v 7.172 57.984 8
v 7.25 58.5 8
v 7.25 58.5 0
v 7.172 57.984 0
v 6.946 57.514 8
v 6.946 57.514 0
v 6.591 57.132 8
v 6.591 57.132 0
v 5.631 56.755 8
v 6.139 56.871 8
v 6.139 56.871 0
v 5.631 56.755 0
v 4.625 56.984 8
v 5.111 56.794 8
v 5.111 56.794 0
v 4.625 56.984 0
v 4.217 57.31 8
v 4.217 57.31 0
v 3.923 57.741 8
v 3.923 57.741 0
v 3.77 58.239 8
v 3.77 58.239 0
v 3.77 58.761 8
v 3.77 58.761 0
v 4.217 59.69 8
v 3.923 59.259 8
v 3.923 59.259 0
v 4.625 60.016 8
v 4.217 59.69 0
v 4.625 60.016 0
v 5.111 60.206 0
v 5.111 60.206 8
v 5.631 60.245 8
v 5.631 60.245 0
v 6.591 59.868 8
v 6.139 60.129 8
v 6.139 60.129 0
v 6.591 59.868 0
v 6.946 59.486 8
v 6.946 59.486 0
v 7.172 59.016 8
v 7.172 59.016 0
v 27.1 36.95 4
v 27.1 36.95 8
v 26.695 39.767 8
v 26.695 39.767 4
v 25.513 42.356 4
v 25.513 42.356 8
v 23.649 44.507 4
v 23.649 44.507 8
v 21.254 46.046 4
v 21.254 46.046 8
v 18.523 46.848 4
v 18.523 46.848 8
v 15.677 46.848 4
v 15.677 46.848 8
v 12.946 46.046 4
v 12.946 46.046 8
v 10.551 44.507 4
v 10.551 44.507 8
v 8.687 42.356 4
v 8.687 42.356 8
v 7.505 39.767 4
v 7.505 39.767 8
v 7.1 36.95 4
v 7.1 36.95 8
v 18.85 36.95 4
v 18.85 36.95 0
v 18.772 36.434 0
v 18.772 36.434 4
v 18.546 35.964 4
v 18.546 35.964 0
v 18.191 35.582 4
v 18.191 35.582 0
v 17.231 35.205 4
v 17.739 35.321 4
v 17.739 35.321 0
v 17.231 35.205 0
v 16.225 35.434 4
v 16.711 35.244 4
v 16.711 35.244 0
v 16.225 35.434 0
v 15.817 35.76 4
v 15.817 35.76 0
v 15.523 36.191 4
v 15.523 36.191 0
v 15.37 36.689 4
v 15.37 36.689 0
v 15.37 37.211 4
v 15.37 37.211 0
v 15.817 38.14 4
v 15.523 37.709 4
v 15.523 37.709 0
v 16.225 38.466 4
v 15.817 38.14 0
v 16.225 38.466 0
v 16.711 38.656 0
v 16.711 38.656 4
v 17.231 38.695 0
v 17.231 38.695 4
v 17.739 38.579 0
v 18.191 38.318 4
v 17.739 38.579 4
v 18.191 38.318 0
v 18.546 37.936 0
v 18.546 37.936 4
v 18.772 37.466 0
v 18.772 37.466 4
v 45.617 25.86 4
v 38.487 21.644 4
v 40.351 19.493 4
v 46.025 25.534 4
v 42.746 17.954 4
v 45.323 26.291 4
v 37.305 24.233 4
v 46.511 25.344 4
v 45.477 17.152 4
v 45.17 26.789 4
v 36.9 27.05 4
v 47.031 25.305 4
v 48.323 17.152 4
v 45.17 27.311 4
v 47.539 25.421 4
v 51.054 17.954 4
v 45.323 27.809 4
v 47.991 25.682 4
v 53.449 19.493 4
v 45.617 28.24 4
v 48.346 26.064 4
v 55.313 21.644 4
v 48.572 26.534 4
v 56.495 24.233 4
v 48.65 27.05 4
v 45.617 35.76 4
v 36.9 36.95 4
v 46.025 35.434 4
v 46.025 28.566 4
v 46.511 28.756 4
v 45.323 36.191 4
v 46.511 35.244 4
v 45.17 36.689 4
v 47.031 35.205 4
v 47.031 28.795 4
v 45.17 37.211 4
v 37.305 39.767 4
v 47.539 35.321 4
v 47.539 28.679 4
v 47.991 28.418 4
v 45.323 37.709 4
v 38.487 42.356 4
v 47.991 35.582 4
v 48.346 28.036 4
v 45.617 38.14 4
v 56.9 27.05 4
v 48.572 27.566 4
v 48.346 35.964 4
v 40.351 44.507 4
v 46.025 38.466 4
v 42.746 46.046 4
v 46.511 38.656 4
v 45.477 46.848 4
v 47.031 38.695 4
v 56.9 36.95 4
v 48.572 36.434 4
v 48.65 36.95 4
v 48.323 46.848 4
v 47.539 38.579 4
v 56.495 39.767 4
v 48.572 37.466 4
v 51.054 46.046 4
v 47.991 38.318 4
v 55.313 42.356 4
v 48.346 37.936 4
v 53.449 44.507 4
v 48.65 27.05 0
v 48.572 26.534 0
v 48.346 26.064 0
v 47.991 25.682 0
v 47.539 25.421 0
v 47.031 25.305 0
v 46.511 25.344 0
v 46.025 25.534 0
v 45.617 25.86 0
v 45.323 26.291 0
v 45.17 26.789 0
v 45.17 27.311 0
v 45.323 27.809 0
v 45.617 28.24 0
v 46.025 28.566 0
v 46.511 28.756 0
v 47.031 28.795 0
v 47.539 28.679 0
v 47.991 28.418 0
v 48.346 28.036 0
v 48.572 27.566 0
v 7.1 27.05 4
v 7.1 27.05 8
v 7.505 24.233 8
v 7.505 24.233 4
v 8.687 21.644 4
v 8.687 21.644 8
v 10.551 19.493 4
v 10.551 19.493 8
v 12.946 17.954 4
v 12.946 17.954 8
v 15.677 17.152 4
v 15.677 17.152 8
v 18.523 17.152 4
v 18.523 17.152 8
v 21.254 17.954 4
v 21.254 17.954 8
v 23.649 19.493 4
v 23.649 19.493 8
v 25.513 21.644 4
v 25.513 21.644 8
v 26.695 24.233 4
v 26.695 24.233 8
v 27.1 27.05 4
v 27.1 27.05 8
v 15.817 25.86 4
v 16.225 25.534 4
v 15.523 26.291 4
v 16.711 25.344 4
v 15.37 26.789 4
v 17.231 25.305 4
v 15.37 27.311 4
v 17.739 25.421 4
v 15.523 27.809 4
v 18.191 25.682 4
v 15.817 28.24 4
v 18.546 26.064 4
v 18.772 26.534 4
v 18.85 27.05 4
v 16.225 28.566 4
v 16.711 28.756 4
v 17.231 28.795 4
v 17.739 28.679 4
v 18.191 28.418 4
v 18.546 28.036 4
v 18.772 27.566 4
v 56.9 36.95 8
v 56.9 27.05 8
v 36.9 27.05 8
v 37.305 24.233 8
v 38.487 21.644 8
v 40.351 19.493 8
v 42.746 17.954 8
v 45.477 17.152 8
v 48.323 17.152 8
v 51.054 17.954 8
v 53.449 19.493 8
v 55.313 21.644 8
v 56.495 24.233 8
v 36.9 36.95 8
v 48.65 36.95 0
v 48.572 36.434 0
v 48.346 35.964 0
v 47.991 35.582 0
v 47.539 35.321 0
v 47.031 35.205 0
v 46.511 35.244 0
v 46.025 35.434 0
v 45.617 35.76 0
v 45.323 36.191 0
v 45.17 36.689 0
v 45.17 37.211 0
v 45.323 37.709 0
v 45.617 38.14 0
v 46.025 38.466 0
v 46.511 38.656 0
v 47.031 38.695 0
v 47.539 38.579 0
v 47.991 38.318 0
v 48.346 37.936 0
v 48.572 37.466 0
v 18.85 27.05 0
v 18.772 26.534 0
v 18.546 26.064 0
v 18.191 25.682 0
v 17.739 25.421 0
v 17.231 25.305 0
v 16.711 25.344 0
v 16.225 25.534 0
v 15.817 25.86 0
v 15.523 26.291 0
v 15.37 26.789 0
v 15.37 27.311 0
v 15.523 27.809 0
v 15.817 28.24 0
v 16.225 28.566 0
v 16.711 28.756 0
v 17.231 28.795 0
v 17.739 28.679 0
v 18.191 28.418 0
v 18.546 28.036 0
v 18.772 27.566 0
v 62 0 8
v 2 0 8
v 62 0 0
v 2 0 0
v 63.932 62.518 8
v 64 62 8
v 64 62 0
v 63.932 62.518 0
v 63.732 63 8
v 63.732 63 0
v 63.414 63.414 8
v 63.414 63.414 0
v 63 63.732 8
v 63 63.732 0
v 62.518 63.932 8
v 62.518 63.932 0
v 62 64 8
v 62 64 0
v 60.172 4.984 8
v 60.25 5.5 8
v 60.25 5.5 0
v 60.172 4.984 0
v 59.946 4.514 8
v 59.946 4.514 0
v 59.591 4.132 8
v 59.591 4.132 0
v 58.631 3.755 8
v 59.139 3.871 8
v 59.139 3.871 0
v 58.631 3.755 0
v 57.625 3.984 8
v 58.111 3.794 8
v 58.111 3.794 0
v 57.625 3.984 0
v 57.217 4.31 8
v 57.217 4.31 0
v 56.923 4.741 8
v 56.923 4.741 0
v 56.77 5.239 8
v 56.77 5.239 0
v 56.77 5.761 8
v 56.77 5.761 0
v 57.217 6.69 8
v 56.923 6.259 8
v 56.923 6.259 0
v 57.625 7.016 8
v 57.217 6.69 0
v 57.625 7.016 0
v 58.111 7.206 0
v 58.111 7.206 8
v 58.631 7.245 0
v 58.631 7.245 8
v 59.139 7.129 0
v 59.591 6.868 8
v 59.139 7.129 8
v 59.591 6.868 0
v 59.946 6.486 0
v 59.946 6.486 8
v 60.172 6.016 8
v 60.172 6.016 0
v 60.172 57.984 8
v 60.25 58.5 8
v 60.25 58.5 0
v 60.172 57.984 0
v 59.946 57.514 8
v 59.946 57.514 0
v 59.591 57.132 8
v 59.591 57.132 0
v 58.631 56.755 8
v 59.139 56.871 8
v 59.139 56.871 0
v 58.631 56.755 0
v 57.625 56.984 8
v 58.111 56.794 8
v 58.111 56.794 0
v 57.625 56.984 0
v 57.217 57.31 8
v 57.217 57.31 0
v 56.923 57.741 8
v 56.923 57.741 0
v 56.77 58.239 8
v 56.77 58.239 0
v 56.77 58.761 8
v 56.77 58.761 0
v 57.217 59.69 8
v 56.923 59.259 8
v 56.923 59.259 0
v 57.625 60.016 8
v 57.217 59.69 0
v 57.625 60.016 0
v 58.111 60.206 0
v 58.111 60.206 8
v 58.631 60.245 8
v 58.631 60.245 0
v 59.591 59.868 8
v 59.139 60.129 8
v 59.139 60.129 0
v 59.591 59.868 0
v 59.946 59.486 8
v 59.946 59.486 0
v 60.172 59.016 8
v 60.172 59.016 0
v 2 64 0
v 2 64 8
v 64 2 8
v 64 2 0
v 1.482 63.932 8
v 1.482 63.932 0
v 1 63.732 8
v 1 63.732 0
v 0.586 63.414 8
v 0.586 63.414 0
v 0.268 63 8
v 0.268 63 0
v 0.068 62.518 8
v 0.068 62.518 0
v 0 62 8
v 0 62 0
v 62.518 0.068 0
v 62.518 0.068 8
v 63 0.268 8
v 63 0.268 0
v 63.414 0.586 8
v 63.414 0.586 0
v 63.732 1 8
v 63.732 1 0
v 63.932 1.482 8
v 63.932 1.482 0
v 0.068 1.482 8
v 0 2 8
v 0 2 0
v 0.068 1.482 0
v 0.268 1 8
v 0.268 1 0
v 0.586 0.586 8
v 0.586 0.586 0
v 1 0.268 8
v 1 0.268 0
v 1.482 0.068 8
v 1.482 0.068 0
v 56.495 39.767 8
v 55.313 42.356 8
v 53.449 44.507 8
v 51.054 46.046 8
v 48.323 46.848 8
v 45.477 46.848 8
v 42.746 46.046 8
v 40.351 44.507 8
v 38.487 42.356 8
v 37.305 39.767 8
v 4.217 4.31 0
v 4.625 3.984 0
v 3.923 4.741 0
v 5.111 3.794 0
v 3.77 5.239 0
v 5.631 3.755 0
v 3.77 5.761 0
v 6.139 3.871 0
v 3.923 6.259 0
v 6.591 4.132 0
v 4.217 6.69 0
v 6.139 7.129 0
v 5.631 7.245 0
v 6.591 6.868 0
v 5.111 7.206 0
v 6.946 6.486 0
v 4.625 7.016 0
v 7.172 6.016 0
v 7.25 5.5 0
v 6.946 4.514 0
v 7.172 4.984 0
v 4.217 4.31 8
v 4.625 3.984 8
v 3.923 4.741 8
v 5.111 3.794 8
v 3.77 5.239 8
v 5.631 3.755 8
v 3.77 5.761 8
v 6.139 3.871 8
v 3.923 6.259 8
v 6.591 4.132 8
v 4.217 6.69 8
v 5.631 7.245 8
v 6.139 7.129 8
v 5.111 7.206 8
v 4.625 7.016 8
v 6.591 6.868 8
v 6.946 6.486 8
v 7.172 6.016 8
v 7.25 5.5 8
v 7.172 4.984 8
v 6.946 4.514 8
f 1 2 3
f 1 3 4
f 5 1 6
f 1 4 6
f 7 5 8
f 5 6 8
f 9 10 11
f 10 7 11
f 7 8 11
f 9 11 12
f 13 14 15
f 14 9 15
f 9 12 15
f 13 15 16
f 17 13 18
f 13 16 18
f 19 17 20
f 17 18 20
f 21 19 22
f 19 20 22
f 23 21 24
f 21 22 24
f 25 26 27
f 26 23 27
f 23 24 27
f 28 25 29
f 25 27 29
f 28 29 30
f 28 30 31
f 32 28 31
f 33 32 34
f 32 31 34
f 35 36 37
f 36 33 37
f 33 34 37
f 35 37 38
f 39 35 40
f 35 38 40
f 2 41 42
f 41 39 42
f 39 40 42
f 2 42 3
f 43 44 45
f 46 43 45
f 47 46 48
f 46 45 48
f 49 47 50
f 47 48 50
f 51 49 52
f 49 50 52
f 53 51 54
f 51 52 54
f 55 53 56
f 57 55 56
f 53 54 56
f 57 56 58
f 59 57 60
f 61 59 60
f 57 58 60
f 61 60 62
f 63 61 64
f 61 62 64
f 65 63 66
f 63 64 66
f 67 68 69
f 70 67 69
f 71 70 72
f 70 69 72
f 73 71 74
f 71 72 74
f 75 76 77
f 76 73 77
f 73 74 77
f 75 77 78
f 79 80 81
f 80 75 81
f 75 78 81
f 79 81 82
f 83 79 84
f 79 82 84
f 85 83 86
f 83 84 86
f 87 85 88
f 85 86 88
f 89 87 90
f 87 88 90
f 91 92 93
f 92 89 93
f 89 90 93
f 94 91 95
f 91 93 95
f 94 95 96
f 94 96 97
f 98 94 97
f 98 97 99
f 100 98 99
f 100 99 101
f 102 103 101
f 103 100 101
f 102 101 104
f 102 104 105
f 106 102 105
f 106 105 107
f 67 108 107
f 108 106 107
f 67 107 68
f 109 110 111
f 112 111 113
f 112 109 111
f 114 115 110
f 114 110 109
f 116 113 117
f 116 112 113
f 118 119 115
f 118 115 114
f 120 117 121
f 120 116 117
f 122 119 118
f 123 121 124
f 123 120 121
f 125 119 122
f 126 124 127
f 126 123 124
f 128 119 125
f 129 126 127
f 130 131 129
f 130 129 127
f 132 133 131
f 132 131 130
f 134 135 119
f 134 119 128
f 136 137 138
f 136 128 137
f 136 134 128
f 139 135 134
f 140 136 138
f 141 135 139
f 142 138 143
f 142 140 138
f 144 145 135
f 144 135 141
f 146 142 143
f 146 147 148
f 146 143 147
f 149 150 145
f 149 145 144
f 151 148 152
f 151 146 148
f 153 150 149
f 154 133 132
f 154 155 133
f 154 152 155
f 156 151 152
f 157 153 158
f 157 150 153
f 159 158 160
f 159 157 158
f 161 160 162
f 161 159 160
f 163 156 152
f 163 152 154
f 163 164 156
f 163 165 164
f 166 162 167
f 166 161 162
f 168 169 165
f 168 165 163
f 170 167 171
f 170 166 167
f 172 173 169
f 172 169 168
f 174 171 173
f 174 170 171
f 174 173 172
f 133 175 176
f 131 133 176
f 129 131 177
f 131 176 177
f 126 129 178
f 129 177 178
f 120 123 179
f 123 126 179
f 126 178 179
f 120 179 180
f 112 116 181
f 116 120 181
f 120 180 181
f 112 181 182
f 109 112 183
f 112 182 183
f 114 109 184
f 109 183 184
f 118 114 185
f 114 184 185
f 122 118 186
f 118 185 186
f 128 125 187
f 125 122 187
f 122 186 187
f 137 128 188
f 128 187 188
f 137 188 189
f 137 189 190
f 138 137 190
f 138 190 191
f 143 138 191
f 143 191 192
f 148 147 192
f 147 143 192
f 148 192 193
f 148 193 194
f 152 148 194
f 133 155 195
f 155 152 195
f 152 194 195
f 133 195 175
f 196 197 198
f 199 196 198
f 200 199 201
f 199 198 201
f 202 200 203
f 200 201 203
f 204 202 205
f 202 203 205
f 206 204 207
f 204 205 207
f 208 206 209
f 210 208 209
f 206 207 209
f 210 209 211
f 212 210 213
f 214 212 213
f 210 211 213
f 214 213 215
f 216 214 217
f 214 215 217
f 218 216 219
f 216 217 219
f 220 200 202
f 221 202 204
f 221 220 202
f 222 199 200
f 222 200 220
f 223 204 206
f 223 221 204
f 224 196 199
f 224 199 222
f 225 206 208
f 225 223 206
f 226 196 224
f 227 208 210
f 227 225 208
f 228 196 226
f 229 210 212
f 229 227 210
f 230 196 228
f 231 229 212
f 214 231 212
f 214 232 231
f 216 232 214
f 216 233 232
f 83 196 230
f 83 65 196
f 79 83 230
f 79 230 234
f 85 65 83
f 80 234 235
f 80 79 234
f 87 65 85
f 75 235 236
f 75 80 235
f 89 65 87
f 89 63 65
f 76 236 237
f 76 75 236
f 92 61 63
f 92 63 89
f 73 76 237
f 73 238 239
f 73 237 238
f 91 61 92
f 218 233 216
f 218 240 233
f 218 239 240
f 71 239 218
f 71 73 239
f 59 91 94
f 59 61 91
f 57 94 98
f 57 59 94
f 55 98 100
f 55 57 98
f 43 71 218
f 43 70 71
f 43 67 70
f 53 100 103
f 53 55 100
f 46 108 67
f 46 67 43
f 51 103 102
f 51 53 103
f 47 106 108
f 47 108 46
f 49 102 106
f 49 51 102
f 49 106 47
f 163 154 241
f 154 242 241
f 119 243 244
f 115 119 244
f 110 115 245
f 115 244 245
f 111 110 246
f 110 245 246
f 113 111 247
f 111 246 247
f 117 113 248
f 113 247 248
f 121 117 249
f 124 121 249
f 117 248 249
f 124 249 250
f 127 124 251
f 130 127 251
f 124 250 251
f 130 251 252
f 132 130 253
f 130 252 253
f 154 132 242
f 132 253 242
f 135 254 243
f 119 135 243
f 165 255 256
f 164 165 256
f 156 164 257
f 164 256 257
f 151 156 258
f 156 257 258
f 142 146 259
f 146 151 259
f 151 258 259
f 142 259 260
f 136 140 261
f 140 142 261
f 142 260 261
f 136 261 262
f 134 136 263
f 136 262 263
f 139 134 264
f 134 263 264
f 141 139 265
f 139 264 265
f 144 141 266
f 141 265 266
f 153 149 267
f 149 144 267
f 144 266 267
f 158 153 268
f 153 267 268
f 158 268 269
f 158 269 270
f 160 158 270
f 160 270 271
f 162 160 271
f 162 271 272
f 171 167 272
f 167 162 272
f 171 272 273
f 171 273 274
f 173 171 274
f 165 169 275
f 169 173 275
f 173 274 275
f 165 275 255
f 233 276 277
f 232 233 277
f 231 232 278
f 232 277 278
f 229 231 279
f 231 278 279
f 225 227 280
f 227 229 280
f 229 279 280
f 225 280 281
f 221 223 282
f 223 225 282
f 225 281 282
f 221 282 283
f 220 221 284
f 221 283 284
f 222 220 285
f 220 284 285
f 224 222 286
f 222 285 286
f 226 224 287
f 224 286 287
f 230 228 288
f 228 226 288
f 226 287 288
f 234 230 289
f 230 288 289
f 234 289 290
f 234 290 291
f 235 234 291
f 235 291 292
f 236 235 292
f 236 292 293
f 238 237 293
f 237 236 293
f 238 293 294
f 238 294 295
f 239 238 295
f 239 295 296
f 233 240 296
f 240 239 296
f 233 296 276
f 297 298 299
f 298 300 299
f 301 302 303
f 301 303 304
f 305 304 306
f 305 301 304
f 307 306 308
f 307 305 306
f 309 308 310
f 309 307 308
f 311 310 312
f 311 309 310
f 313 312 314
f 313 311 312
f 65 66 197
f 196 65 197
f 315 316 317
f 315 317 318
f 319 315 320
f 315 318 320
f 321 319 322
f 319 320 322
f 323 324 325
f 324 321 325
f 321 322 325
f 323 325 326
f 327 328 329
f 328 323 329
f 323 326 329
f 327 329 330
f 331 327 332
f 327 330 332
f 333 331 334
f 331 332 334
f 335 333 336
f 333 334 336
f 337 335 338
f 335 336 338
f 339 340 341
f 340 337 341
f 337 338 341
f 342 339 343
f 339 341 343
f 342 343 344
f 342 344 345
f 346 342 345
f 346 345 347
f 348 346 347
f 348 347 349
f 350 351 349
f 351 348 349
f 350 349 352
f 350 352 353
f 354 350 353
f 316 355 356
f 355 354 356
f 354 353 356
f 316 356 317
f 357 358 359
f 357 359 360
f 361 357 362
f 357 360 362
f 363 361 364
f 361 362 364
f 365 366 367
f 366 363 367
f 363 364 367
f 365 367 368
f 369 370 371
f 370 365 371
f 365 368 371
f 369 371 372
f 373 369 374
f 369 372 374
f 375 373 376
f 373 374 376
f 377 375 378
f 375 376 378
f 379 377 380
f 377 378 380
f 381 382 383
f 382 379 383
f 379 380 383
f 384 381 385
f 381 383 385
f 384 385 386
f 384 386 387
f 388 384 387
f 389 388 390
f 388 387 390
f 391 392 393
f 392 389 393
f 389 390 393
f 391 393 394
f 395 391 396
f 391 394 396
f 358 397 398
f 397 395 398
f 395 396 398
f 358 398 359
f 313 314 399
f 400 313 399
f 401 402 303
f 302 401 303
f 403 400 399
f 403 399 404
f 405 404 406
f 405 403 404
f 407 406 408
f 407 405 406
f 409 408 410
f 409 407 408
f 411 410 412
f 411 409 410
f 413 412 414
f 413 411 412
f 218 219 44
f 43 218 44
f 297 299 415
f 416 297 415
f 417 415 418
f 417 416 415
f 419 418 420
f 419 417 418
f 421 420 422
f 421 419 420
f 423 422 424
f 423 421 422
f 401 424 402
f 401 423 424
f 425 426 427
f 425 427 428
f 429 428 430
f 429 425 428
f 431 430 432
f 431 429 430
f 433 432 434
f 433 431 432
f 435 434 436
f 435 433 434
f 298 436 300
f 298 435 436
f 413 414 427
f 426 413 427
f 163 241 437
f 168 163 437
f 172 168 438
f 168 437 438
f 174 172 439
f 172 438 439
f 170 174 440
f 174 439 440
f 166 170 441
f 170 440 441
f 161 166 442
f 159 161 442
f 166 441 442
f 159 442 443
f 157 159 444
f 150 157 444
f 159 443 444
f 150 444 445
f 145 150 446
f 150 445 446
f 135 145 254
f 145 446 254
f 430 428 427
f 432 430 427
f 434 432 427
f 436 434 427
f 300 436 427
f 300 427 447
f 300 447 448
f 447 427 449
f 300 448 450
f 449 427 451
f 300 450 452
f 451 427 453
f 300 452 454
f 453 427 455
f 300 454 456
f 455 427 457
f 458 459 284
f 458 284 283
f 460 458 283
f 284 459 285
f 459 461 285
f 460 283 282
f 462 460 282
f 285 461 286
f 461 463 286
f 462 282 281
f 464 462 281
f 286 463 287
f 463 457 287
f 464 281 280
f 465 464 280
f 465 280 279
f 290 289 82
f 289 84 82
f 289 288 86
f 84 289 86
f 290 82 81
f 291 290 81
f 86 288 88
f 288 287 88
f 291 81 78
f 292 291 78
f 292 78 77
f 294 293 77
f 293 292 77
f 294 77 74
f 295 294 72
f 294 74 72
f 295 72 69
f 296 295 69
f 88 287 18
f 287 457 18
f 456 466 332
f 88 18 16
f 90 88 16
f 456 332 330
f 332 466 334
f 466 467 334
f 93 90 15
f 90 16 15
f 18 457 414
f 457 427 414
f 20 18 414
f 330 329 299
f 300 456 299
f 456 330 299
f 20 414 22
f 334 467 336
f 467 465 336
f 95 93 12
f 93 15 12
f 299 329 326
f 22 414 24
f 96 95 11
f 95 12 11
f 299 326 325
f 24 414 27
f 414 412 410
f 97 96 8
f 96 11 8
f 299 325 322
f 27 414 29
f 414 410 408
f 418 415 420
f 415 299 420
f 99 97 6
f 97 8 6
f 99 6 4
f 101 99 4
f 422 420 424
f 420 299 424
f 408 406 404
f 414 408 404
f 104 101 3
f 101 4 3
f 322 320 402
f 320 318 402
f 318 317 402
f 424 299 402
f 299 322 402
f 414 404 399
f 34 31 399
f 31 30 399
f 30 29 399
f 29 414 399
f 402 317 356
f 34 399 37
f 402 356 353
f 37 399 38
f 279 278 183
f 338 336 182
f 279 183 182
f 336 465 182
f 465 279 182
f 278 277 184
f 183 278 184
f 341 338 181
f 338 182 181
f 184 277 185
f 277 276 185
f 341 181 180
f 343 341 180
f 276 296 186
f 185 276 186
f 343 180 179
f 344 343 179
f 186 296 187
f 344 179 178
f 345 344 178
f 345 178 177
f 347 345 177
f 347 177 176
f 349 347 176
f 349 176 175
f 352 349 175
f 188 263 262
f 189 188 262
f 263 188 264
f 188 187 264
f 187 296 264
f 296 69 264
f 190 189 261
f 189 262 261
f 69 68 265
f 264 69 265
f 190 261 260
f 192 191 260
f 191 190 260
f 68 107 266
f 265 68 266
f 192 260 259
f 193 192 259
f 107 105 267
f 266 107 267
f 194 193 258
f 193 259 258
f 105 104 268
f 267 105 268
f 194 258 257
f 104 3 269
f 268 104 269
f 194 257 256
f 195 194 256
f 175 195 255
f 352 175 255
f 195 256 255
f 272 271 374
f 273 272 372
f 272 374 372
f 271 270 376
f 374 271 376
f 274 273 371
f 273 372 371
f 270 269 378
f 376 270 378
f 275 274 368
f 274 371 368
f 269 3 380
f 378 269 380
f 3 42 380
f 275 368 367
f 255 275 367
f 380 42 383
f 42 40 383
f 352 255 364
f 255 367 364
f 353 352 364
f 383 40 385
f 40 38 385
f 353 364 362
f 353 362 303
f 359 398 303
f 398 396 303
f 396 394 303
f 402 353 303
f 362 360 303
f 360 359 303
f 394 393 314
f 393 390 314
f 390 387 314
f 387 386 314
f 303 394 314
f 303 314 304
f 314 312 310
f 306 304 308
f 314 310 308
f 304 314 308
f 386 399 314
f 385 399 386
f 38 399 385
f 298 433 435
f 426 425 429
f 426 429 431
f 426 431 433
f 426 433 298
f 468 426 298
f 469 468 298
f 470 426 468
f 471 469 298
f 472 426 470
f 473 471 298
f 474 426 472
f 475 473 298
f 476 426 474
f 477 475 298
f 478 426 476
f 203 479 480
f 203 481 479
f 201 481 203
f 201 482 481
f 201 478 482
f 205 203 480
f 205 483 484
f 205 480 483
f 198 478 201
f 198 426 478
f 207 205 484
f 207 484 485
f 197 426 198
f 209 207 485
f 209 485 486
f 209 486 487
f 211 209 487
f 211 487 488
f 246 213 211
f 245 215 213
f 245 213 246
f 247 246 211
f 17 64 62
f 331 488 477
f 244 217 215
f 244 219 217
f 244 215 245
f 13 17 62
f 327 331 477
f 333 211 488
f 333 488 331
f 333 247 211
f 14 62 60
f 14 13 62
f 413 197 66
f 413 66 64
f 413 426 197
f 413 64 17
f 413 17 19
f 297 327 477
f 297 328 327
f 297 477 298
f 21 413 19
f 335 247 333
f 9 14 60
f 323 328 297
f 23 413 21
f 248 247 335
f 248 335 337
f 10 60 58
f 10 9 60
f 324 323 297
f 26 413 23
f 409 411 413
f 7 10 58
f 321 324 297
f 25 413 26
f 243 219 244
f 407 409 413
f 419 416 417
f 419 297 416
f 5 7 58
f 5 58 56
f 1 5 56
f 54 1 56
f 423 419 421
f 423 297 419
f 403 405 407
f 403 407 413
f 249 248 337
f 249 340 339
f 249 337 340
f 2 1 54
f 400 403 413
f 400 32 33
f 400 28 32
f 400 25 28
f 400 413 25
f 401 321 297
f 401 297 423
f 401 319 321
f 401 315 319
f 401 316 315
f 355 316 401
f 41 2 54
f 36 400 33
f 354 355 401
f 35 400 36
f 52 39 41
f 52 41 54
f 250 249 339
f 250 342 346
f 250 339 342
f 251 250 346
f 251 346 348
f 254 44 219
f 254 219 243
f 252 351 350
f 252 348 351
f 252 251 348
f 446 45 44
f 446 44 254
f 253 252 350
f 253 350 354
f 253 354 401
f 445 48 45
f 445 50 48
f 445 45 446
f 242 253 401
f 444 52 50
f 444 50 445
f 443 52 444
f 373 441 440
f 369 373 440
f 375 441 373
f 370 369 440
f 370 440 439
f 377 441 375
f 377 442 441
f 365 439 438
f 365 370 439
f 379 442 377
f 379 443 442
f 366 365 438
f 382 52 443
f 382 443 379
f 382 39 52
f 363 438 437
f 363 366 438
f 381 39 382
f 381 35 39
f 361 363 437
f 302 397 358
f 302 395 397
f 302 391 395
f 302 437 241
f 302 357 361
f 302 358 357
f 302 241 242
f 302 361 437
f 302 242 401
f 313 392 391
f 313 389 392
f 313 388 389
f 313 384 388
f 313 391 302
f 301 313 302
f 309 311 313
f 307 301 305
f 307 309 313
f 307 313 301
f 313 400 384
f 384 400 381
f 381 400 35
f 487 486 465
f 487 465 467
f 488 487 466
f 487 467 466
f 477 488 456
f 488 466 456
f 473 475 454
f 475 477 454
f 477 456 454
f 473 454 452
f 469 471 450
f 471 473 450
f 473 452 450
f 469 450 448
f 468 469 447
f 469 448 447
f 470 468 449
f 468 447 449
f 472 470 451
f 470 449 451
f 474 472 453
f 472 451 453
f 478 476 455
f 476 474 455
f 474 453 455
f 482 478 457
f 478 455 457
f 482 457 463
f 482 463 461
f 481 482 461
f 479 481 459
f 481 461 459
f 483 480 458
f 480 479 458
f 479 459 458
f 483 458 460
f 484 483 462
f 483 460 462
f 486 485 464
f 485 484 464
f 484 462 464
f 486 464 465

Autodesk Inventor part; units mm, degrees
ref_plane "YZ Plane" through (0, 0, 0) normal (1, 0, 0) x (0, 1, 0)
ref_plane "XZ Plane" through (0, 0, 0) normal (0, 1, 0) x (-1, 0, 0)
ref_plane "XY Plane" through (0, 0, 0) normal (0, 0, 1) x (1, 0, 0)
sketch "スケッチ1" plane through (0, 0, 0) normal (0, 0, 1) x (1, 0, 0)
  line L0 (0, 0) -> (64, 0)
  line L1 (64, 0) -> (64, 64)
  line L2 (64, 64) -> (0, 64)
  line L3 (0, 64) -> (0, 0)
  line L4 (5.5, 58.5) -> (58.5, 58.5) construction
  line L5 (58.5, 58.5) -> (58.5, 5.5) construction
  line L6 (58.5, 5.5) -> (5.5, 5.5) construction
  line L7 (5.5, 5.5) -> (5.5, 58.5) construction
  circle A0 centre (5.5, 58.5) radius 1.75
  circle A1 centre (5.5, 5.5) radius 1.75
  circle A2 centre (58.5, 5.5) radius 1.75
  circle A3 centre (58.5, 58.5) radius 1.75
  line L8 (0, 32) -> (64, 32) construction
  line L9 (32, 64) -> (32, 0) construction
  line L10 (17.1, 27.05) -> (46.9, 27.05) construction
  line L11 (46.9, 27.05) -> (46.9, 36.95) construction
  line L12 (46.9, 36.95) -> (17.1, 36.95) construction
  line L13 (17.1, 36.95) -> (17.1, 27.05) construction
  line L14 (17.1, 27.05) -> (46.9, 36.95) construction
  line L15 (46.9, 27.05) -> (17.1, 36.95) construction
  circle A4 centre (46.9, 36.95) radius 1.75
  circle A5 centre (46.9, 27.05) radius 1.75
  circle A6 centre (17.1, 27.05) radius 1.75
  circle A7 centre (17.1, 36.95) radius 1.75
  point P0 (32, 32)
  dimension "d0" = 64
  dimension "d2" = 53
  dimension "d3" = 3.5
  dimension "d4" = 3.5
  dimension "d5" = 9.9
  dimension "d6" = 29.8
extrude "押し出し1" add sketch "スケッチ1" along normal blind 8
fillet "フィレット1" radius 2 4 edges at (0, 0, 4) (64, 0, 4) (64, 64, 4) (0, 64, 4)
sketch "スケッチ2" plane through (0, 0, 8) normal (0, 0, 1) x (1, 0, 0)
  circle A0 centre (17.1, 36.95) radius 1.75 projected
  circle A1 centre (17.1, 27.05) radius 1.75 projected
  line L0 (17.1, 36.95) -> (17.1, 27.05) construction
  line L1 (7.1, 36.95) -> (7.1, 27.05)
  line L2 (27.1, 27.05) -> (27.1, 36.95)
  arc A2 (27.1, 36.95) -> (7.1, 36.95) centre (17.1, 36.95) ccw
  arc A3 (7.1, 27.05) -> (27.1, 27.05) centre (17.1, 27.05) ccw
  circle A4 centre (46.9, 36.95) radius 1.75 projected
  circle A5 centre (46.9, 27.05) radius 1.75 projected
  line L3 (46.9, 36.95) -> (46.9, 27.05) construction
  line L4 (36.9, 36.95) -> (36.9, 27.05)
  line L5 (56.9, 27.05) -> (56.9, 36.95)
  arc A6 (56.9, 36.95) -> (36.9, 36.95) centre (46.9, 36.95) ccw
  arc A7 (36.9, 27.05) -> (56.9, 27.05) centre (46.9, 27.05) ccw
  point P0 (0, 0)
  point P1 (17.1, 32)
  point P2 (46.9, 32)
  dimension "d10" = 10
  dimension "d11" = 10
extrude "押し出し2" cut sketch "スケッチ2" against normal blind 4
properties part number "_3D プリント"
